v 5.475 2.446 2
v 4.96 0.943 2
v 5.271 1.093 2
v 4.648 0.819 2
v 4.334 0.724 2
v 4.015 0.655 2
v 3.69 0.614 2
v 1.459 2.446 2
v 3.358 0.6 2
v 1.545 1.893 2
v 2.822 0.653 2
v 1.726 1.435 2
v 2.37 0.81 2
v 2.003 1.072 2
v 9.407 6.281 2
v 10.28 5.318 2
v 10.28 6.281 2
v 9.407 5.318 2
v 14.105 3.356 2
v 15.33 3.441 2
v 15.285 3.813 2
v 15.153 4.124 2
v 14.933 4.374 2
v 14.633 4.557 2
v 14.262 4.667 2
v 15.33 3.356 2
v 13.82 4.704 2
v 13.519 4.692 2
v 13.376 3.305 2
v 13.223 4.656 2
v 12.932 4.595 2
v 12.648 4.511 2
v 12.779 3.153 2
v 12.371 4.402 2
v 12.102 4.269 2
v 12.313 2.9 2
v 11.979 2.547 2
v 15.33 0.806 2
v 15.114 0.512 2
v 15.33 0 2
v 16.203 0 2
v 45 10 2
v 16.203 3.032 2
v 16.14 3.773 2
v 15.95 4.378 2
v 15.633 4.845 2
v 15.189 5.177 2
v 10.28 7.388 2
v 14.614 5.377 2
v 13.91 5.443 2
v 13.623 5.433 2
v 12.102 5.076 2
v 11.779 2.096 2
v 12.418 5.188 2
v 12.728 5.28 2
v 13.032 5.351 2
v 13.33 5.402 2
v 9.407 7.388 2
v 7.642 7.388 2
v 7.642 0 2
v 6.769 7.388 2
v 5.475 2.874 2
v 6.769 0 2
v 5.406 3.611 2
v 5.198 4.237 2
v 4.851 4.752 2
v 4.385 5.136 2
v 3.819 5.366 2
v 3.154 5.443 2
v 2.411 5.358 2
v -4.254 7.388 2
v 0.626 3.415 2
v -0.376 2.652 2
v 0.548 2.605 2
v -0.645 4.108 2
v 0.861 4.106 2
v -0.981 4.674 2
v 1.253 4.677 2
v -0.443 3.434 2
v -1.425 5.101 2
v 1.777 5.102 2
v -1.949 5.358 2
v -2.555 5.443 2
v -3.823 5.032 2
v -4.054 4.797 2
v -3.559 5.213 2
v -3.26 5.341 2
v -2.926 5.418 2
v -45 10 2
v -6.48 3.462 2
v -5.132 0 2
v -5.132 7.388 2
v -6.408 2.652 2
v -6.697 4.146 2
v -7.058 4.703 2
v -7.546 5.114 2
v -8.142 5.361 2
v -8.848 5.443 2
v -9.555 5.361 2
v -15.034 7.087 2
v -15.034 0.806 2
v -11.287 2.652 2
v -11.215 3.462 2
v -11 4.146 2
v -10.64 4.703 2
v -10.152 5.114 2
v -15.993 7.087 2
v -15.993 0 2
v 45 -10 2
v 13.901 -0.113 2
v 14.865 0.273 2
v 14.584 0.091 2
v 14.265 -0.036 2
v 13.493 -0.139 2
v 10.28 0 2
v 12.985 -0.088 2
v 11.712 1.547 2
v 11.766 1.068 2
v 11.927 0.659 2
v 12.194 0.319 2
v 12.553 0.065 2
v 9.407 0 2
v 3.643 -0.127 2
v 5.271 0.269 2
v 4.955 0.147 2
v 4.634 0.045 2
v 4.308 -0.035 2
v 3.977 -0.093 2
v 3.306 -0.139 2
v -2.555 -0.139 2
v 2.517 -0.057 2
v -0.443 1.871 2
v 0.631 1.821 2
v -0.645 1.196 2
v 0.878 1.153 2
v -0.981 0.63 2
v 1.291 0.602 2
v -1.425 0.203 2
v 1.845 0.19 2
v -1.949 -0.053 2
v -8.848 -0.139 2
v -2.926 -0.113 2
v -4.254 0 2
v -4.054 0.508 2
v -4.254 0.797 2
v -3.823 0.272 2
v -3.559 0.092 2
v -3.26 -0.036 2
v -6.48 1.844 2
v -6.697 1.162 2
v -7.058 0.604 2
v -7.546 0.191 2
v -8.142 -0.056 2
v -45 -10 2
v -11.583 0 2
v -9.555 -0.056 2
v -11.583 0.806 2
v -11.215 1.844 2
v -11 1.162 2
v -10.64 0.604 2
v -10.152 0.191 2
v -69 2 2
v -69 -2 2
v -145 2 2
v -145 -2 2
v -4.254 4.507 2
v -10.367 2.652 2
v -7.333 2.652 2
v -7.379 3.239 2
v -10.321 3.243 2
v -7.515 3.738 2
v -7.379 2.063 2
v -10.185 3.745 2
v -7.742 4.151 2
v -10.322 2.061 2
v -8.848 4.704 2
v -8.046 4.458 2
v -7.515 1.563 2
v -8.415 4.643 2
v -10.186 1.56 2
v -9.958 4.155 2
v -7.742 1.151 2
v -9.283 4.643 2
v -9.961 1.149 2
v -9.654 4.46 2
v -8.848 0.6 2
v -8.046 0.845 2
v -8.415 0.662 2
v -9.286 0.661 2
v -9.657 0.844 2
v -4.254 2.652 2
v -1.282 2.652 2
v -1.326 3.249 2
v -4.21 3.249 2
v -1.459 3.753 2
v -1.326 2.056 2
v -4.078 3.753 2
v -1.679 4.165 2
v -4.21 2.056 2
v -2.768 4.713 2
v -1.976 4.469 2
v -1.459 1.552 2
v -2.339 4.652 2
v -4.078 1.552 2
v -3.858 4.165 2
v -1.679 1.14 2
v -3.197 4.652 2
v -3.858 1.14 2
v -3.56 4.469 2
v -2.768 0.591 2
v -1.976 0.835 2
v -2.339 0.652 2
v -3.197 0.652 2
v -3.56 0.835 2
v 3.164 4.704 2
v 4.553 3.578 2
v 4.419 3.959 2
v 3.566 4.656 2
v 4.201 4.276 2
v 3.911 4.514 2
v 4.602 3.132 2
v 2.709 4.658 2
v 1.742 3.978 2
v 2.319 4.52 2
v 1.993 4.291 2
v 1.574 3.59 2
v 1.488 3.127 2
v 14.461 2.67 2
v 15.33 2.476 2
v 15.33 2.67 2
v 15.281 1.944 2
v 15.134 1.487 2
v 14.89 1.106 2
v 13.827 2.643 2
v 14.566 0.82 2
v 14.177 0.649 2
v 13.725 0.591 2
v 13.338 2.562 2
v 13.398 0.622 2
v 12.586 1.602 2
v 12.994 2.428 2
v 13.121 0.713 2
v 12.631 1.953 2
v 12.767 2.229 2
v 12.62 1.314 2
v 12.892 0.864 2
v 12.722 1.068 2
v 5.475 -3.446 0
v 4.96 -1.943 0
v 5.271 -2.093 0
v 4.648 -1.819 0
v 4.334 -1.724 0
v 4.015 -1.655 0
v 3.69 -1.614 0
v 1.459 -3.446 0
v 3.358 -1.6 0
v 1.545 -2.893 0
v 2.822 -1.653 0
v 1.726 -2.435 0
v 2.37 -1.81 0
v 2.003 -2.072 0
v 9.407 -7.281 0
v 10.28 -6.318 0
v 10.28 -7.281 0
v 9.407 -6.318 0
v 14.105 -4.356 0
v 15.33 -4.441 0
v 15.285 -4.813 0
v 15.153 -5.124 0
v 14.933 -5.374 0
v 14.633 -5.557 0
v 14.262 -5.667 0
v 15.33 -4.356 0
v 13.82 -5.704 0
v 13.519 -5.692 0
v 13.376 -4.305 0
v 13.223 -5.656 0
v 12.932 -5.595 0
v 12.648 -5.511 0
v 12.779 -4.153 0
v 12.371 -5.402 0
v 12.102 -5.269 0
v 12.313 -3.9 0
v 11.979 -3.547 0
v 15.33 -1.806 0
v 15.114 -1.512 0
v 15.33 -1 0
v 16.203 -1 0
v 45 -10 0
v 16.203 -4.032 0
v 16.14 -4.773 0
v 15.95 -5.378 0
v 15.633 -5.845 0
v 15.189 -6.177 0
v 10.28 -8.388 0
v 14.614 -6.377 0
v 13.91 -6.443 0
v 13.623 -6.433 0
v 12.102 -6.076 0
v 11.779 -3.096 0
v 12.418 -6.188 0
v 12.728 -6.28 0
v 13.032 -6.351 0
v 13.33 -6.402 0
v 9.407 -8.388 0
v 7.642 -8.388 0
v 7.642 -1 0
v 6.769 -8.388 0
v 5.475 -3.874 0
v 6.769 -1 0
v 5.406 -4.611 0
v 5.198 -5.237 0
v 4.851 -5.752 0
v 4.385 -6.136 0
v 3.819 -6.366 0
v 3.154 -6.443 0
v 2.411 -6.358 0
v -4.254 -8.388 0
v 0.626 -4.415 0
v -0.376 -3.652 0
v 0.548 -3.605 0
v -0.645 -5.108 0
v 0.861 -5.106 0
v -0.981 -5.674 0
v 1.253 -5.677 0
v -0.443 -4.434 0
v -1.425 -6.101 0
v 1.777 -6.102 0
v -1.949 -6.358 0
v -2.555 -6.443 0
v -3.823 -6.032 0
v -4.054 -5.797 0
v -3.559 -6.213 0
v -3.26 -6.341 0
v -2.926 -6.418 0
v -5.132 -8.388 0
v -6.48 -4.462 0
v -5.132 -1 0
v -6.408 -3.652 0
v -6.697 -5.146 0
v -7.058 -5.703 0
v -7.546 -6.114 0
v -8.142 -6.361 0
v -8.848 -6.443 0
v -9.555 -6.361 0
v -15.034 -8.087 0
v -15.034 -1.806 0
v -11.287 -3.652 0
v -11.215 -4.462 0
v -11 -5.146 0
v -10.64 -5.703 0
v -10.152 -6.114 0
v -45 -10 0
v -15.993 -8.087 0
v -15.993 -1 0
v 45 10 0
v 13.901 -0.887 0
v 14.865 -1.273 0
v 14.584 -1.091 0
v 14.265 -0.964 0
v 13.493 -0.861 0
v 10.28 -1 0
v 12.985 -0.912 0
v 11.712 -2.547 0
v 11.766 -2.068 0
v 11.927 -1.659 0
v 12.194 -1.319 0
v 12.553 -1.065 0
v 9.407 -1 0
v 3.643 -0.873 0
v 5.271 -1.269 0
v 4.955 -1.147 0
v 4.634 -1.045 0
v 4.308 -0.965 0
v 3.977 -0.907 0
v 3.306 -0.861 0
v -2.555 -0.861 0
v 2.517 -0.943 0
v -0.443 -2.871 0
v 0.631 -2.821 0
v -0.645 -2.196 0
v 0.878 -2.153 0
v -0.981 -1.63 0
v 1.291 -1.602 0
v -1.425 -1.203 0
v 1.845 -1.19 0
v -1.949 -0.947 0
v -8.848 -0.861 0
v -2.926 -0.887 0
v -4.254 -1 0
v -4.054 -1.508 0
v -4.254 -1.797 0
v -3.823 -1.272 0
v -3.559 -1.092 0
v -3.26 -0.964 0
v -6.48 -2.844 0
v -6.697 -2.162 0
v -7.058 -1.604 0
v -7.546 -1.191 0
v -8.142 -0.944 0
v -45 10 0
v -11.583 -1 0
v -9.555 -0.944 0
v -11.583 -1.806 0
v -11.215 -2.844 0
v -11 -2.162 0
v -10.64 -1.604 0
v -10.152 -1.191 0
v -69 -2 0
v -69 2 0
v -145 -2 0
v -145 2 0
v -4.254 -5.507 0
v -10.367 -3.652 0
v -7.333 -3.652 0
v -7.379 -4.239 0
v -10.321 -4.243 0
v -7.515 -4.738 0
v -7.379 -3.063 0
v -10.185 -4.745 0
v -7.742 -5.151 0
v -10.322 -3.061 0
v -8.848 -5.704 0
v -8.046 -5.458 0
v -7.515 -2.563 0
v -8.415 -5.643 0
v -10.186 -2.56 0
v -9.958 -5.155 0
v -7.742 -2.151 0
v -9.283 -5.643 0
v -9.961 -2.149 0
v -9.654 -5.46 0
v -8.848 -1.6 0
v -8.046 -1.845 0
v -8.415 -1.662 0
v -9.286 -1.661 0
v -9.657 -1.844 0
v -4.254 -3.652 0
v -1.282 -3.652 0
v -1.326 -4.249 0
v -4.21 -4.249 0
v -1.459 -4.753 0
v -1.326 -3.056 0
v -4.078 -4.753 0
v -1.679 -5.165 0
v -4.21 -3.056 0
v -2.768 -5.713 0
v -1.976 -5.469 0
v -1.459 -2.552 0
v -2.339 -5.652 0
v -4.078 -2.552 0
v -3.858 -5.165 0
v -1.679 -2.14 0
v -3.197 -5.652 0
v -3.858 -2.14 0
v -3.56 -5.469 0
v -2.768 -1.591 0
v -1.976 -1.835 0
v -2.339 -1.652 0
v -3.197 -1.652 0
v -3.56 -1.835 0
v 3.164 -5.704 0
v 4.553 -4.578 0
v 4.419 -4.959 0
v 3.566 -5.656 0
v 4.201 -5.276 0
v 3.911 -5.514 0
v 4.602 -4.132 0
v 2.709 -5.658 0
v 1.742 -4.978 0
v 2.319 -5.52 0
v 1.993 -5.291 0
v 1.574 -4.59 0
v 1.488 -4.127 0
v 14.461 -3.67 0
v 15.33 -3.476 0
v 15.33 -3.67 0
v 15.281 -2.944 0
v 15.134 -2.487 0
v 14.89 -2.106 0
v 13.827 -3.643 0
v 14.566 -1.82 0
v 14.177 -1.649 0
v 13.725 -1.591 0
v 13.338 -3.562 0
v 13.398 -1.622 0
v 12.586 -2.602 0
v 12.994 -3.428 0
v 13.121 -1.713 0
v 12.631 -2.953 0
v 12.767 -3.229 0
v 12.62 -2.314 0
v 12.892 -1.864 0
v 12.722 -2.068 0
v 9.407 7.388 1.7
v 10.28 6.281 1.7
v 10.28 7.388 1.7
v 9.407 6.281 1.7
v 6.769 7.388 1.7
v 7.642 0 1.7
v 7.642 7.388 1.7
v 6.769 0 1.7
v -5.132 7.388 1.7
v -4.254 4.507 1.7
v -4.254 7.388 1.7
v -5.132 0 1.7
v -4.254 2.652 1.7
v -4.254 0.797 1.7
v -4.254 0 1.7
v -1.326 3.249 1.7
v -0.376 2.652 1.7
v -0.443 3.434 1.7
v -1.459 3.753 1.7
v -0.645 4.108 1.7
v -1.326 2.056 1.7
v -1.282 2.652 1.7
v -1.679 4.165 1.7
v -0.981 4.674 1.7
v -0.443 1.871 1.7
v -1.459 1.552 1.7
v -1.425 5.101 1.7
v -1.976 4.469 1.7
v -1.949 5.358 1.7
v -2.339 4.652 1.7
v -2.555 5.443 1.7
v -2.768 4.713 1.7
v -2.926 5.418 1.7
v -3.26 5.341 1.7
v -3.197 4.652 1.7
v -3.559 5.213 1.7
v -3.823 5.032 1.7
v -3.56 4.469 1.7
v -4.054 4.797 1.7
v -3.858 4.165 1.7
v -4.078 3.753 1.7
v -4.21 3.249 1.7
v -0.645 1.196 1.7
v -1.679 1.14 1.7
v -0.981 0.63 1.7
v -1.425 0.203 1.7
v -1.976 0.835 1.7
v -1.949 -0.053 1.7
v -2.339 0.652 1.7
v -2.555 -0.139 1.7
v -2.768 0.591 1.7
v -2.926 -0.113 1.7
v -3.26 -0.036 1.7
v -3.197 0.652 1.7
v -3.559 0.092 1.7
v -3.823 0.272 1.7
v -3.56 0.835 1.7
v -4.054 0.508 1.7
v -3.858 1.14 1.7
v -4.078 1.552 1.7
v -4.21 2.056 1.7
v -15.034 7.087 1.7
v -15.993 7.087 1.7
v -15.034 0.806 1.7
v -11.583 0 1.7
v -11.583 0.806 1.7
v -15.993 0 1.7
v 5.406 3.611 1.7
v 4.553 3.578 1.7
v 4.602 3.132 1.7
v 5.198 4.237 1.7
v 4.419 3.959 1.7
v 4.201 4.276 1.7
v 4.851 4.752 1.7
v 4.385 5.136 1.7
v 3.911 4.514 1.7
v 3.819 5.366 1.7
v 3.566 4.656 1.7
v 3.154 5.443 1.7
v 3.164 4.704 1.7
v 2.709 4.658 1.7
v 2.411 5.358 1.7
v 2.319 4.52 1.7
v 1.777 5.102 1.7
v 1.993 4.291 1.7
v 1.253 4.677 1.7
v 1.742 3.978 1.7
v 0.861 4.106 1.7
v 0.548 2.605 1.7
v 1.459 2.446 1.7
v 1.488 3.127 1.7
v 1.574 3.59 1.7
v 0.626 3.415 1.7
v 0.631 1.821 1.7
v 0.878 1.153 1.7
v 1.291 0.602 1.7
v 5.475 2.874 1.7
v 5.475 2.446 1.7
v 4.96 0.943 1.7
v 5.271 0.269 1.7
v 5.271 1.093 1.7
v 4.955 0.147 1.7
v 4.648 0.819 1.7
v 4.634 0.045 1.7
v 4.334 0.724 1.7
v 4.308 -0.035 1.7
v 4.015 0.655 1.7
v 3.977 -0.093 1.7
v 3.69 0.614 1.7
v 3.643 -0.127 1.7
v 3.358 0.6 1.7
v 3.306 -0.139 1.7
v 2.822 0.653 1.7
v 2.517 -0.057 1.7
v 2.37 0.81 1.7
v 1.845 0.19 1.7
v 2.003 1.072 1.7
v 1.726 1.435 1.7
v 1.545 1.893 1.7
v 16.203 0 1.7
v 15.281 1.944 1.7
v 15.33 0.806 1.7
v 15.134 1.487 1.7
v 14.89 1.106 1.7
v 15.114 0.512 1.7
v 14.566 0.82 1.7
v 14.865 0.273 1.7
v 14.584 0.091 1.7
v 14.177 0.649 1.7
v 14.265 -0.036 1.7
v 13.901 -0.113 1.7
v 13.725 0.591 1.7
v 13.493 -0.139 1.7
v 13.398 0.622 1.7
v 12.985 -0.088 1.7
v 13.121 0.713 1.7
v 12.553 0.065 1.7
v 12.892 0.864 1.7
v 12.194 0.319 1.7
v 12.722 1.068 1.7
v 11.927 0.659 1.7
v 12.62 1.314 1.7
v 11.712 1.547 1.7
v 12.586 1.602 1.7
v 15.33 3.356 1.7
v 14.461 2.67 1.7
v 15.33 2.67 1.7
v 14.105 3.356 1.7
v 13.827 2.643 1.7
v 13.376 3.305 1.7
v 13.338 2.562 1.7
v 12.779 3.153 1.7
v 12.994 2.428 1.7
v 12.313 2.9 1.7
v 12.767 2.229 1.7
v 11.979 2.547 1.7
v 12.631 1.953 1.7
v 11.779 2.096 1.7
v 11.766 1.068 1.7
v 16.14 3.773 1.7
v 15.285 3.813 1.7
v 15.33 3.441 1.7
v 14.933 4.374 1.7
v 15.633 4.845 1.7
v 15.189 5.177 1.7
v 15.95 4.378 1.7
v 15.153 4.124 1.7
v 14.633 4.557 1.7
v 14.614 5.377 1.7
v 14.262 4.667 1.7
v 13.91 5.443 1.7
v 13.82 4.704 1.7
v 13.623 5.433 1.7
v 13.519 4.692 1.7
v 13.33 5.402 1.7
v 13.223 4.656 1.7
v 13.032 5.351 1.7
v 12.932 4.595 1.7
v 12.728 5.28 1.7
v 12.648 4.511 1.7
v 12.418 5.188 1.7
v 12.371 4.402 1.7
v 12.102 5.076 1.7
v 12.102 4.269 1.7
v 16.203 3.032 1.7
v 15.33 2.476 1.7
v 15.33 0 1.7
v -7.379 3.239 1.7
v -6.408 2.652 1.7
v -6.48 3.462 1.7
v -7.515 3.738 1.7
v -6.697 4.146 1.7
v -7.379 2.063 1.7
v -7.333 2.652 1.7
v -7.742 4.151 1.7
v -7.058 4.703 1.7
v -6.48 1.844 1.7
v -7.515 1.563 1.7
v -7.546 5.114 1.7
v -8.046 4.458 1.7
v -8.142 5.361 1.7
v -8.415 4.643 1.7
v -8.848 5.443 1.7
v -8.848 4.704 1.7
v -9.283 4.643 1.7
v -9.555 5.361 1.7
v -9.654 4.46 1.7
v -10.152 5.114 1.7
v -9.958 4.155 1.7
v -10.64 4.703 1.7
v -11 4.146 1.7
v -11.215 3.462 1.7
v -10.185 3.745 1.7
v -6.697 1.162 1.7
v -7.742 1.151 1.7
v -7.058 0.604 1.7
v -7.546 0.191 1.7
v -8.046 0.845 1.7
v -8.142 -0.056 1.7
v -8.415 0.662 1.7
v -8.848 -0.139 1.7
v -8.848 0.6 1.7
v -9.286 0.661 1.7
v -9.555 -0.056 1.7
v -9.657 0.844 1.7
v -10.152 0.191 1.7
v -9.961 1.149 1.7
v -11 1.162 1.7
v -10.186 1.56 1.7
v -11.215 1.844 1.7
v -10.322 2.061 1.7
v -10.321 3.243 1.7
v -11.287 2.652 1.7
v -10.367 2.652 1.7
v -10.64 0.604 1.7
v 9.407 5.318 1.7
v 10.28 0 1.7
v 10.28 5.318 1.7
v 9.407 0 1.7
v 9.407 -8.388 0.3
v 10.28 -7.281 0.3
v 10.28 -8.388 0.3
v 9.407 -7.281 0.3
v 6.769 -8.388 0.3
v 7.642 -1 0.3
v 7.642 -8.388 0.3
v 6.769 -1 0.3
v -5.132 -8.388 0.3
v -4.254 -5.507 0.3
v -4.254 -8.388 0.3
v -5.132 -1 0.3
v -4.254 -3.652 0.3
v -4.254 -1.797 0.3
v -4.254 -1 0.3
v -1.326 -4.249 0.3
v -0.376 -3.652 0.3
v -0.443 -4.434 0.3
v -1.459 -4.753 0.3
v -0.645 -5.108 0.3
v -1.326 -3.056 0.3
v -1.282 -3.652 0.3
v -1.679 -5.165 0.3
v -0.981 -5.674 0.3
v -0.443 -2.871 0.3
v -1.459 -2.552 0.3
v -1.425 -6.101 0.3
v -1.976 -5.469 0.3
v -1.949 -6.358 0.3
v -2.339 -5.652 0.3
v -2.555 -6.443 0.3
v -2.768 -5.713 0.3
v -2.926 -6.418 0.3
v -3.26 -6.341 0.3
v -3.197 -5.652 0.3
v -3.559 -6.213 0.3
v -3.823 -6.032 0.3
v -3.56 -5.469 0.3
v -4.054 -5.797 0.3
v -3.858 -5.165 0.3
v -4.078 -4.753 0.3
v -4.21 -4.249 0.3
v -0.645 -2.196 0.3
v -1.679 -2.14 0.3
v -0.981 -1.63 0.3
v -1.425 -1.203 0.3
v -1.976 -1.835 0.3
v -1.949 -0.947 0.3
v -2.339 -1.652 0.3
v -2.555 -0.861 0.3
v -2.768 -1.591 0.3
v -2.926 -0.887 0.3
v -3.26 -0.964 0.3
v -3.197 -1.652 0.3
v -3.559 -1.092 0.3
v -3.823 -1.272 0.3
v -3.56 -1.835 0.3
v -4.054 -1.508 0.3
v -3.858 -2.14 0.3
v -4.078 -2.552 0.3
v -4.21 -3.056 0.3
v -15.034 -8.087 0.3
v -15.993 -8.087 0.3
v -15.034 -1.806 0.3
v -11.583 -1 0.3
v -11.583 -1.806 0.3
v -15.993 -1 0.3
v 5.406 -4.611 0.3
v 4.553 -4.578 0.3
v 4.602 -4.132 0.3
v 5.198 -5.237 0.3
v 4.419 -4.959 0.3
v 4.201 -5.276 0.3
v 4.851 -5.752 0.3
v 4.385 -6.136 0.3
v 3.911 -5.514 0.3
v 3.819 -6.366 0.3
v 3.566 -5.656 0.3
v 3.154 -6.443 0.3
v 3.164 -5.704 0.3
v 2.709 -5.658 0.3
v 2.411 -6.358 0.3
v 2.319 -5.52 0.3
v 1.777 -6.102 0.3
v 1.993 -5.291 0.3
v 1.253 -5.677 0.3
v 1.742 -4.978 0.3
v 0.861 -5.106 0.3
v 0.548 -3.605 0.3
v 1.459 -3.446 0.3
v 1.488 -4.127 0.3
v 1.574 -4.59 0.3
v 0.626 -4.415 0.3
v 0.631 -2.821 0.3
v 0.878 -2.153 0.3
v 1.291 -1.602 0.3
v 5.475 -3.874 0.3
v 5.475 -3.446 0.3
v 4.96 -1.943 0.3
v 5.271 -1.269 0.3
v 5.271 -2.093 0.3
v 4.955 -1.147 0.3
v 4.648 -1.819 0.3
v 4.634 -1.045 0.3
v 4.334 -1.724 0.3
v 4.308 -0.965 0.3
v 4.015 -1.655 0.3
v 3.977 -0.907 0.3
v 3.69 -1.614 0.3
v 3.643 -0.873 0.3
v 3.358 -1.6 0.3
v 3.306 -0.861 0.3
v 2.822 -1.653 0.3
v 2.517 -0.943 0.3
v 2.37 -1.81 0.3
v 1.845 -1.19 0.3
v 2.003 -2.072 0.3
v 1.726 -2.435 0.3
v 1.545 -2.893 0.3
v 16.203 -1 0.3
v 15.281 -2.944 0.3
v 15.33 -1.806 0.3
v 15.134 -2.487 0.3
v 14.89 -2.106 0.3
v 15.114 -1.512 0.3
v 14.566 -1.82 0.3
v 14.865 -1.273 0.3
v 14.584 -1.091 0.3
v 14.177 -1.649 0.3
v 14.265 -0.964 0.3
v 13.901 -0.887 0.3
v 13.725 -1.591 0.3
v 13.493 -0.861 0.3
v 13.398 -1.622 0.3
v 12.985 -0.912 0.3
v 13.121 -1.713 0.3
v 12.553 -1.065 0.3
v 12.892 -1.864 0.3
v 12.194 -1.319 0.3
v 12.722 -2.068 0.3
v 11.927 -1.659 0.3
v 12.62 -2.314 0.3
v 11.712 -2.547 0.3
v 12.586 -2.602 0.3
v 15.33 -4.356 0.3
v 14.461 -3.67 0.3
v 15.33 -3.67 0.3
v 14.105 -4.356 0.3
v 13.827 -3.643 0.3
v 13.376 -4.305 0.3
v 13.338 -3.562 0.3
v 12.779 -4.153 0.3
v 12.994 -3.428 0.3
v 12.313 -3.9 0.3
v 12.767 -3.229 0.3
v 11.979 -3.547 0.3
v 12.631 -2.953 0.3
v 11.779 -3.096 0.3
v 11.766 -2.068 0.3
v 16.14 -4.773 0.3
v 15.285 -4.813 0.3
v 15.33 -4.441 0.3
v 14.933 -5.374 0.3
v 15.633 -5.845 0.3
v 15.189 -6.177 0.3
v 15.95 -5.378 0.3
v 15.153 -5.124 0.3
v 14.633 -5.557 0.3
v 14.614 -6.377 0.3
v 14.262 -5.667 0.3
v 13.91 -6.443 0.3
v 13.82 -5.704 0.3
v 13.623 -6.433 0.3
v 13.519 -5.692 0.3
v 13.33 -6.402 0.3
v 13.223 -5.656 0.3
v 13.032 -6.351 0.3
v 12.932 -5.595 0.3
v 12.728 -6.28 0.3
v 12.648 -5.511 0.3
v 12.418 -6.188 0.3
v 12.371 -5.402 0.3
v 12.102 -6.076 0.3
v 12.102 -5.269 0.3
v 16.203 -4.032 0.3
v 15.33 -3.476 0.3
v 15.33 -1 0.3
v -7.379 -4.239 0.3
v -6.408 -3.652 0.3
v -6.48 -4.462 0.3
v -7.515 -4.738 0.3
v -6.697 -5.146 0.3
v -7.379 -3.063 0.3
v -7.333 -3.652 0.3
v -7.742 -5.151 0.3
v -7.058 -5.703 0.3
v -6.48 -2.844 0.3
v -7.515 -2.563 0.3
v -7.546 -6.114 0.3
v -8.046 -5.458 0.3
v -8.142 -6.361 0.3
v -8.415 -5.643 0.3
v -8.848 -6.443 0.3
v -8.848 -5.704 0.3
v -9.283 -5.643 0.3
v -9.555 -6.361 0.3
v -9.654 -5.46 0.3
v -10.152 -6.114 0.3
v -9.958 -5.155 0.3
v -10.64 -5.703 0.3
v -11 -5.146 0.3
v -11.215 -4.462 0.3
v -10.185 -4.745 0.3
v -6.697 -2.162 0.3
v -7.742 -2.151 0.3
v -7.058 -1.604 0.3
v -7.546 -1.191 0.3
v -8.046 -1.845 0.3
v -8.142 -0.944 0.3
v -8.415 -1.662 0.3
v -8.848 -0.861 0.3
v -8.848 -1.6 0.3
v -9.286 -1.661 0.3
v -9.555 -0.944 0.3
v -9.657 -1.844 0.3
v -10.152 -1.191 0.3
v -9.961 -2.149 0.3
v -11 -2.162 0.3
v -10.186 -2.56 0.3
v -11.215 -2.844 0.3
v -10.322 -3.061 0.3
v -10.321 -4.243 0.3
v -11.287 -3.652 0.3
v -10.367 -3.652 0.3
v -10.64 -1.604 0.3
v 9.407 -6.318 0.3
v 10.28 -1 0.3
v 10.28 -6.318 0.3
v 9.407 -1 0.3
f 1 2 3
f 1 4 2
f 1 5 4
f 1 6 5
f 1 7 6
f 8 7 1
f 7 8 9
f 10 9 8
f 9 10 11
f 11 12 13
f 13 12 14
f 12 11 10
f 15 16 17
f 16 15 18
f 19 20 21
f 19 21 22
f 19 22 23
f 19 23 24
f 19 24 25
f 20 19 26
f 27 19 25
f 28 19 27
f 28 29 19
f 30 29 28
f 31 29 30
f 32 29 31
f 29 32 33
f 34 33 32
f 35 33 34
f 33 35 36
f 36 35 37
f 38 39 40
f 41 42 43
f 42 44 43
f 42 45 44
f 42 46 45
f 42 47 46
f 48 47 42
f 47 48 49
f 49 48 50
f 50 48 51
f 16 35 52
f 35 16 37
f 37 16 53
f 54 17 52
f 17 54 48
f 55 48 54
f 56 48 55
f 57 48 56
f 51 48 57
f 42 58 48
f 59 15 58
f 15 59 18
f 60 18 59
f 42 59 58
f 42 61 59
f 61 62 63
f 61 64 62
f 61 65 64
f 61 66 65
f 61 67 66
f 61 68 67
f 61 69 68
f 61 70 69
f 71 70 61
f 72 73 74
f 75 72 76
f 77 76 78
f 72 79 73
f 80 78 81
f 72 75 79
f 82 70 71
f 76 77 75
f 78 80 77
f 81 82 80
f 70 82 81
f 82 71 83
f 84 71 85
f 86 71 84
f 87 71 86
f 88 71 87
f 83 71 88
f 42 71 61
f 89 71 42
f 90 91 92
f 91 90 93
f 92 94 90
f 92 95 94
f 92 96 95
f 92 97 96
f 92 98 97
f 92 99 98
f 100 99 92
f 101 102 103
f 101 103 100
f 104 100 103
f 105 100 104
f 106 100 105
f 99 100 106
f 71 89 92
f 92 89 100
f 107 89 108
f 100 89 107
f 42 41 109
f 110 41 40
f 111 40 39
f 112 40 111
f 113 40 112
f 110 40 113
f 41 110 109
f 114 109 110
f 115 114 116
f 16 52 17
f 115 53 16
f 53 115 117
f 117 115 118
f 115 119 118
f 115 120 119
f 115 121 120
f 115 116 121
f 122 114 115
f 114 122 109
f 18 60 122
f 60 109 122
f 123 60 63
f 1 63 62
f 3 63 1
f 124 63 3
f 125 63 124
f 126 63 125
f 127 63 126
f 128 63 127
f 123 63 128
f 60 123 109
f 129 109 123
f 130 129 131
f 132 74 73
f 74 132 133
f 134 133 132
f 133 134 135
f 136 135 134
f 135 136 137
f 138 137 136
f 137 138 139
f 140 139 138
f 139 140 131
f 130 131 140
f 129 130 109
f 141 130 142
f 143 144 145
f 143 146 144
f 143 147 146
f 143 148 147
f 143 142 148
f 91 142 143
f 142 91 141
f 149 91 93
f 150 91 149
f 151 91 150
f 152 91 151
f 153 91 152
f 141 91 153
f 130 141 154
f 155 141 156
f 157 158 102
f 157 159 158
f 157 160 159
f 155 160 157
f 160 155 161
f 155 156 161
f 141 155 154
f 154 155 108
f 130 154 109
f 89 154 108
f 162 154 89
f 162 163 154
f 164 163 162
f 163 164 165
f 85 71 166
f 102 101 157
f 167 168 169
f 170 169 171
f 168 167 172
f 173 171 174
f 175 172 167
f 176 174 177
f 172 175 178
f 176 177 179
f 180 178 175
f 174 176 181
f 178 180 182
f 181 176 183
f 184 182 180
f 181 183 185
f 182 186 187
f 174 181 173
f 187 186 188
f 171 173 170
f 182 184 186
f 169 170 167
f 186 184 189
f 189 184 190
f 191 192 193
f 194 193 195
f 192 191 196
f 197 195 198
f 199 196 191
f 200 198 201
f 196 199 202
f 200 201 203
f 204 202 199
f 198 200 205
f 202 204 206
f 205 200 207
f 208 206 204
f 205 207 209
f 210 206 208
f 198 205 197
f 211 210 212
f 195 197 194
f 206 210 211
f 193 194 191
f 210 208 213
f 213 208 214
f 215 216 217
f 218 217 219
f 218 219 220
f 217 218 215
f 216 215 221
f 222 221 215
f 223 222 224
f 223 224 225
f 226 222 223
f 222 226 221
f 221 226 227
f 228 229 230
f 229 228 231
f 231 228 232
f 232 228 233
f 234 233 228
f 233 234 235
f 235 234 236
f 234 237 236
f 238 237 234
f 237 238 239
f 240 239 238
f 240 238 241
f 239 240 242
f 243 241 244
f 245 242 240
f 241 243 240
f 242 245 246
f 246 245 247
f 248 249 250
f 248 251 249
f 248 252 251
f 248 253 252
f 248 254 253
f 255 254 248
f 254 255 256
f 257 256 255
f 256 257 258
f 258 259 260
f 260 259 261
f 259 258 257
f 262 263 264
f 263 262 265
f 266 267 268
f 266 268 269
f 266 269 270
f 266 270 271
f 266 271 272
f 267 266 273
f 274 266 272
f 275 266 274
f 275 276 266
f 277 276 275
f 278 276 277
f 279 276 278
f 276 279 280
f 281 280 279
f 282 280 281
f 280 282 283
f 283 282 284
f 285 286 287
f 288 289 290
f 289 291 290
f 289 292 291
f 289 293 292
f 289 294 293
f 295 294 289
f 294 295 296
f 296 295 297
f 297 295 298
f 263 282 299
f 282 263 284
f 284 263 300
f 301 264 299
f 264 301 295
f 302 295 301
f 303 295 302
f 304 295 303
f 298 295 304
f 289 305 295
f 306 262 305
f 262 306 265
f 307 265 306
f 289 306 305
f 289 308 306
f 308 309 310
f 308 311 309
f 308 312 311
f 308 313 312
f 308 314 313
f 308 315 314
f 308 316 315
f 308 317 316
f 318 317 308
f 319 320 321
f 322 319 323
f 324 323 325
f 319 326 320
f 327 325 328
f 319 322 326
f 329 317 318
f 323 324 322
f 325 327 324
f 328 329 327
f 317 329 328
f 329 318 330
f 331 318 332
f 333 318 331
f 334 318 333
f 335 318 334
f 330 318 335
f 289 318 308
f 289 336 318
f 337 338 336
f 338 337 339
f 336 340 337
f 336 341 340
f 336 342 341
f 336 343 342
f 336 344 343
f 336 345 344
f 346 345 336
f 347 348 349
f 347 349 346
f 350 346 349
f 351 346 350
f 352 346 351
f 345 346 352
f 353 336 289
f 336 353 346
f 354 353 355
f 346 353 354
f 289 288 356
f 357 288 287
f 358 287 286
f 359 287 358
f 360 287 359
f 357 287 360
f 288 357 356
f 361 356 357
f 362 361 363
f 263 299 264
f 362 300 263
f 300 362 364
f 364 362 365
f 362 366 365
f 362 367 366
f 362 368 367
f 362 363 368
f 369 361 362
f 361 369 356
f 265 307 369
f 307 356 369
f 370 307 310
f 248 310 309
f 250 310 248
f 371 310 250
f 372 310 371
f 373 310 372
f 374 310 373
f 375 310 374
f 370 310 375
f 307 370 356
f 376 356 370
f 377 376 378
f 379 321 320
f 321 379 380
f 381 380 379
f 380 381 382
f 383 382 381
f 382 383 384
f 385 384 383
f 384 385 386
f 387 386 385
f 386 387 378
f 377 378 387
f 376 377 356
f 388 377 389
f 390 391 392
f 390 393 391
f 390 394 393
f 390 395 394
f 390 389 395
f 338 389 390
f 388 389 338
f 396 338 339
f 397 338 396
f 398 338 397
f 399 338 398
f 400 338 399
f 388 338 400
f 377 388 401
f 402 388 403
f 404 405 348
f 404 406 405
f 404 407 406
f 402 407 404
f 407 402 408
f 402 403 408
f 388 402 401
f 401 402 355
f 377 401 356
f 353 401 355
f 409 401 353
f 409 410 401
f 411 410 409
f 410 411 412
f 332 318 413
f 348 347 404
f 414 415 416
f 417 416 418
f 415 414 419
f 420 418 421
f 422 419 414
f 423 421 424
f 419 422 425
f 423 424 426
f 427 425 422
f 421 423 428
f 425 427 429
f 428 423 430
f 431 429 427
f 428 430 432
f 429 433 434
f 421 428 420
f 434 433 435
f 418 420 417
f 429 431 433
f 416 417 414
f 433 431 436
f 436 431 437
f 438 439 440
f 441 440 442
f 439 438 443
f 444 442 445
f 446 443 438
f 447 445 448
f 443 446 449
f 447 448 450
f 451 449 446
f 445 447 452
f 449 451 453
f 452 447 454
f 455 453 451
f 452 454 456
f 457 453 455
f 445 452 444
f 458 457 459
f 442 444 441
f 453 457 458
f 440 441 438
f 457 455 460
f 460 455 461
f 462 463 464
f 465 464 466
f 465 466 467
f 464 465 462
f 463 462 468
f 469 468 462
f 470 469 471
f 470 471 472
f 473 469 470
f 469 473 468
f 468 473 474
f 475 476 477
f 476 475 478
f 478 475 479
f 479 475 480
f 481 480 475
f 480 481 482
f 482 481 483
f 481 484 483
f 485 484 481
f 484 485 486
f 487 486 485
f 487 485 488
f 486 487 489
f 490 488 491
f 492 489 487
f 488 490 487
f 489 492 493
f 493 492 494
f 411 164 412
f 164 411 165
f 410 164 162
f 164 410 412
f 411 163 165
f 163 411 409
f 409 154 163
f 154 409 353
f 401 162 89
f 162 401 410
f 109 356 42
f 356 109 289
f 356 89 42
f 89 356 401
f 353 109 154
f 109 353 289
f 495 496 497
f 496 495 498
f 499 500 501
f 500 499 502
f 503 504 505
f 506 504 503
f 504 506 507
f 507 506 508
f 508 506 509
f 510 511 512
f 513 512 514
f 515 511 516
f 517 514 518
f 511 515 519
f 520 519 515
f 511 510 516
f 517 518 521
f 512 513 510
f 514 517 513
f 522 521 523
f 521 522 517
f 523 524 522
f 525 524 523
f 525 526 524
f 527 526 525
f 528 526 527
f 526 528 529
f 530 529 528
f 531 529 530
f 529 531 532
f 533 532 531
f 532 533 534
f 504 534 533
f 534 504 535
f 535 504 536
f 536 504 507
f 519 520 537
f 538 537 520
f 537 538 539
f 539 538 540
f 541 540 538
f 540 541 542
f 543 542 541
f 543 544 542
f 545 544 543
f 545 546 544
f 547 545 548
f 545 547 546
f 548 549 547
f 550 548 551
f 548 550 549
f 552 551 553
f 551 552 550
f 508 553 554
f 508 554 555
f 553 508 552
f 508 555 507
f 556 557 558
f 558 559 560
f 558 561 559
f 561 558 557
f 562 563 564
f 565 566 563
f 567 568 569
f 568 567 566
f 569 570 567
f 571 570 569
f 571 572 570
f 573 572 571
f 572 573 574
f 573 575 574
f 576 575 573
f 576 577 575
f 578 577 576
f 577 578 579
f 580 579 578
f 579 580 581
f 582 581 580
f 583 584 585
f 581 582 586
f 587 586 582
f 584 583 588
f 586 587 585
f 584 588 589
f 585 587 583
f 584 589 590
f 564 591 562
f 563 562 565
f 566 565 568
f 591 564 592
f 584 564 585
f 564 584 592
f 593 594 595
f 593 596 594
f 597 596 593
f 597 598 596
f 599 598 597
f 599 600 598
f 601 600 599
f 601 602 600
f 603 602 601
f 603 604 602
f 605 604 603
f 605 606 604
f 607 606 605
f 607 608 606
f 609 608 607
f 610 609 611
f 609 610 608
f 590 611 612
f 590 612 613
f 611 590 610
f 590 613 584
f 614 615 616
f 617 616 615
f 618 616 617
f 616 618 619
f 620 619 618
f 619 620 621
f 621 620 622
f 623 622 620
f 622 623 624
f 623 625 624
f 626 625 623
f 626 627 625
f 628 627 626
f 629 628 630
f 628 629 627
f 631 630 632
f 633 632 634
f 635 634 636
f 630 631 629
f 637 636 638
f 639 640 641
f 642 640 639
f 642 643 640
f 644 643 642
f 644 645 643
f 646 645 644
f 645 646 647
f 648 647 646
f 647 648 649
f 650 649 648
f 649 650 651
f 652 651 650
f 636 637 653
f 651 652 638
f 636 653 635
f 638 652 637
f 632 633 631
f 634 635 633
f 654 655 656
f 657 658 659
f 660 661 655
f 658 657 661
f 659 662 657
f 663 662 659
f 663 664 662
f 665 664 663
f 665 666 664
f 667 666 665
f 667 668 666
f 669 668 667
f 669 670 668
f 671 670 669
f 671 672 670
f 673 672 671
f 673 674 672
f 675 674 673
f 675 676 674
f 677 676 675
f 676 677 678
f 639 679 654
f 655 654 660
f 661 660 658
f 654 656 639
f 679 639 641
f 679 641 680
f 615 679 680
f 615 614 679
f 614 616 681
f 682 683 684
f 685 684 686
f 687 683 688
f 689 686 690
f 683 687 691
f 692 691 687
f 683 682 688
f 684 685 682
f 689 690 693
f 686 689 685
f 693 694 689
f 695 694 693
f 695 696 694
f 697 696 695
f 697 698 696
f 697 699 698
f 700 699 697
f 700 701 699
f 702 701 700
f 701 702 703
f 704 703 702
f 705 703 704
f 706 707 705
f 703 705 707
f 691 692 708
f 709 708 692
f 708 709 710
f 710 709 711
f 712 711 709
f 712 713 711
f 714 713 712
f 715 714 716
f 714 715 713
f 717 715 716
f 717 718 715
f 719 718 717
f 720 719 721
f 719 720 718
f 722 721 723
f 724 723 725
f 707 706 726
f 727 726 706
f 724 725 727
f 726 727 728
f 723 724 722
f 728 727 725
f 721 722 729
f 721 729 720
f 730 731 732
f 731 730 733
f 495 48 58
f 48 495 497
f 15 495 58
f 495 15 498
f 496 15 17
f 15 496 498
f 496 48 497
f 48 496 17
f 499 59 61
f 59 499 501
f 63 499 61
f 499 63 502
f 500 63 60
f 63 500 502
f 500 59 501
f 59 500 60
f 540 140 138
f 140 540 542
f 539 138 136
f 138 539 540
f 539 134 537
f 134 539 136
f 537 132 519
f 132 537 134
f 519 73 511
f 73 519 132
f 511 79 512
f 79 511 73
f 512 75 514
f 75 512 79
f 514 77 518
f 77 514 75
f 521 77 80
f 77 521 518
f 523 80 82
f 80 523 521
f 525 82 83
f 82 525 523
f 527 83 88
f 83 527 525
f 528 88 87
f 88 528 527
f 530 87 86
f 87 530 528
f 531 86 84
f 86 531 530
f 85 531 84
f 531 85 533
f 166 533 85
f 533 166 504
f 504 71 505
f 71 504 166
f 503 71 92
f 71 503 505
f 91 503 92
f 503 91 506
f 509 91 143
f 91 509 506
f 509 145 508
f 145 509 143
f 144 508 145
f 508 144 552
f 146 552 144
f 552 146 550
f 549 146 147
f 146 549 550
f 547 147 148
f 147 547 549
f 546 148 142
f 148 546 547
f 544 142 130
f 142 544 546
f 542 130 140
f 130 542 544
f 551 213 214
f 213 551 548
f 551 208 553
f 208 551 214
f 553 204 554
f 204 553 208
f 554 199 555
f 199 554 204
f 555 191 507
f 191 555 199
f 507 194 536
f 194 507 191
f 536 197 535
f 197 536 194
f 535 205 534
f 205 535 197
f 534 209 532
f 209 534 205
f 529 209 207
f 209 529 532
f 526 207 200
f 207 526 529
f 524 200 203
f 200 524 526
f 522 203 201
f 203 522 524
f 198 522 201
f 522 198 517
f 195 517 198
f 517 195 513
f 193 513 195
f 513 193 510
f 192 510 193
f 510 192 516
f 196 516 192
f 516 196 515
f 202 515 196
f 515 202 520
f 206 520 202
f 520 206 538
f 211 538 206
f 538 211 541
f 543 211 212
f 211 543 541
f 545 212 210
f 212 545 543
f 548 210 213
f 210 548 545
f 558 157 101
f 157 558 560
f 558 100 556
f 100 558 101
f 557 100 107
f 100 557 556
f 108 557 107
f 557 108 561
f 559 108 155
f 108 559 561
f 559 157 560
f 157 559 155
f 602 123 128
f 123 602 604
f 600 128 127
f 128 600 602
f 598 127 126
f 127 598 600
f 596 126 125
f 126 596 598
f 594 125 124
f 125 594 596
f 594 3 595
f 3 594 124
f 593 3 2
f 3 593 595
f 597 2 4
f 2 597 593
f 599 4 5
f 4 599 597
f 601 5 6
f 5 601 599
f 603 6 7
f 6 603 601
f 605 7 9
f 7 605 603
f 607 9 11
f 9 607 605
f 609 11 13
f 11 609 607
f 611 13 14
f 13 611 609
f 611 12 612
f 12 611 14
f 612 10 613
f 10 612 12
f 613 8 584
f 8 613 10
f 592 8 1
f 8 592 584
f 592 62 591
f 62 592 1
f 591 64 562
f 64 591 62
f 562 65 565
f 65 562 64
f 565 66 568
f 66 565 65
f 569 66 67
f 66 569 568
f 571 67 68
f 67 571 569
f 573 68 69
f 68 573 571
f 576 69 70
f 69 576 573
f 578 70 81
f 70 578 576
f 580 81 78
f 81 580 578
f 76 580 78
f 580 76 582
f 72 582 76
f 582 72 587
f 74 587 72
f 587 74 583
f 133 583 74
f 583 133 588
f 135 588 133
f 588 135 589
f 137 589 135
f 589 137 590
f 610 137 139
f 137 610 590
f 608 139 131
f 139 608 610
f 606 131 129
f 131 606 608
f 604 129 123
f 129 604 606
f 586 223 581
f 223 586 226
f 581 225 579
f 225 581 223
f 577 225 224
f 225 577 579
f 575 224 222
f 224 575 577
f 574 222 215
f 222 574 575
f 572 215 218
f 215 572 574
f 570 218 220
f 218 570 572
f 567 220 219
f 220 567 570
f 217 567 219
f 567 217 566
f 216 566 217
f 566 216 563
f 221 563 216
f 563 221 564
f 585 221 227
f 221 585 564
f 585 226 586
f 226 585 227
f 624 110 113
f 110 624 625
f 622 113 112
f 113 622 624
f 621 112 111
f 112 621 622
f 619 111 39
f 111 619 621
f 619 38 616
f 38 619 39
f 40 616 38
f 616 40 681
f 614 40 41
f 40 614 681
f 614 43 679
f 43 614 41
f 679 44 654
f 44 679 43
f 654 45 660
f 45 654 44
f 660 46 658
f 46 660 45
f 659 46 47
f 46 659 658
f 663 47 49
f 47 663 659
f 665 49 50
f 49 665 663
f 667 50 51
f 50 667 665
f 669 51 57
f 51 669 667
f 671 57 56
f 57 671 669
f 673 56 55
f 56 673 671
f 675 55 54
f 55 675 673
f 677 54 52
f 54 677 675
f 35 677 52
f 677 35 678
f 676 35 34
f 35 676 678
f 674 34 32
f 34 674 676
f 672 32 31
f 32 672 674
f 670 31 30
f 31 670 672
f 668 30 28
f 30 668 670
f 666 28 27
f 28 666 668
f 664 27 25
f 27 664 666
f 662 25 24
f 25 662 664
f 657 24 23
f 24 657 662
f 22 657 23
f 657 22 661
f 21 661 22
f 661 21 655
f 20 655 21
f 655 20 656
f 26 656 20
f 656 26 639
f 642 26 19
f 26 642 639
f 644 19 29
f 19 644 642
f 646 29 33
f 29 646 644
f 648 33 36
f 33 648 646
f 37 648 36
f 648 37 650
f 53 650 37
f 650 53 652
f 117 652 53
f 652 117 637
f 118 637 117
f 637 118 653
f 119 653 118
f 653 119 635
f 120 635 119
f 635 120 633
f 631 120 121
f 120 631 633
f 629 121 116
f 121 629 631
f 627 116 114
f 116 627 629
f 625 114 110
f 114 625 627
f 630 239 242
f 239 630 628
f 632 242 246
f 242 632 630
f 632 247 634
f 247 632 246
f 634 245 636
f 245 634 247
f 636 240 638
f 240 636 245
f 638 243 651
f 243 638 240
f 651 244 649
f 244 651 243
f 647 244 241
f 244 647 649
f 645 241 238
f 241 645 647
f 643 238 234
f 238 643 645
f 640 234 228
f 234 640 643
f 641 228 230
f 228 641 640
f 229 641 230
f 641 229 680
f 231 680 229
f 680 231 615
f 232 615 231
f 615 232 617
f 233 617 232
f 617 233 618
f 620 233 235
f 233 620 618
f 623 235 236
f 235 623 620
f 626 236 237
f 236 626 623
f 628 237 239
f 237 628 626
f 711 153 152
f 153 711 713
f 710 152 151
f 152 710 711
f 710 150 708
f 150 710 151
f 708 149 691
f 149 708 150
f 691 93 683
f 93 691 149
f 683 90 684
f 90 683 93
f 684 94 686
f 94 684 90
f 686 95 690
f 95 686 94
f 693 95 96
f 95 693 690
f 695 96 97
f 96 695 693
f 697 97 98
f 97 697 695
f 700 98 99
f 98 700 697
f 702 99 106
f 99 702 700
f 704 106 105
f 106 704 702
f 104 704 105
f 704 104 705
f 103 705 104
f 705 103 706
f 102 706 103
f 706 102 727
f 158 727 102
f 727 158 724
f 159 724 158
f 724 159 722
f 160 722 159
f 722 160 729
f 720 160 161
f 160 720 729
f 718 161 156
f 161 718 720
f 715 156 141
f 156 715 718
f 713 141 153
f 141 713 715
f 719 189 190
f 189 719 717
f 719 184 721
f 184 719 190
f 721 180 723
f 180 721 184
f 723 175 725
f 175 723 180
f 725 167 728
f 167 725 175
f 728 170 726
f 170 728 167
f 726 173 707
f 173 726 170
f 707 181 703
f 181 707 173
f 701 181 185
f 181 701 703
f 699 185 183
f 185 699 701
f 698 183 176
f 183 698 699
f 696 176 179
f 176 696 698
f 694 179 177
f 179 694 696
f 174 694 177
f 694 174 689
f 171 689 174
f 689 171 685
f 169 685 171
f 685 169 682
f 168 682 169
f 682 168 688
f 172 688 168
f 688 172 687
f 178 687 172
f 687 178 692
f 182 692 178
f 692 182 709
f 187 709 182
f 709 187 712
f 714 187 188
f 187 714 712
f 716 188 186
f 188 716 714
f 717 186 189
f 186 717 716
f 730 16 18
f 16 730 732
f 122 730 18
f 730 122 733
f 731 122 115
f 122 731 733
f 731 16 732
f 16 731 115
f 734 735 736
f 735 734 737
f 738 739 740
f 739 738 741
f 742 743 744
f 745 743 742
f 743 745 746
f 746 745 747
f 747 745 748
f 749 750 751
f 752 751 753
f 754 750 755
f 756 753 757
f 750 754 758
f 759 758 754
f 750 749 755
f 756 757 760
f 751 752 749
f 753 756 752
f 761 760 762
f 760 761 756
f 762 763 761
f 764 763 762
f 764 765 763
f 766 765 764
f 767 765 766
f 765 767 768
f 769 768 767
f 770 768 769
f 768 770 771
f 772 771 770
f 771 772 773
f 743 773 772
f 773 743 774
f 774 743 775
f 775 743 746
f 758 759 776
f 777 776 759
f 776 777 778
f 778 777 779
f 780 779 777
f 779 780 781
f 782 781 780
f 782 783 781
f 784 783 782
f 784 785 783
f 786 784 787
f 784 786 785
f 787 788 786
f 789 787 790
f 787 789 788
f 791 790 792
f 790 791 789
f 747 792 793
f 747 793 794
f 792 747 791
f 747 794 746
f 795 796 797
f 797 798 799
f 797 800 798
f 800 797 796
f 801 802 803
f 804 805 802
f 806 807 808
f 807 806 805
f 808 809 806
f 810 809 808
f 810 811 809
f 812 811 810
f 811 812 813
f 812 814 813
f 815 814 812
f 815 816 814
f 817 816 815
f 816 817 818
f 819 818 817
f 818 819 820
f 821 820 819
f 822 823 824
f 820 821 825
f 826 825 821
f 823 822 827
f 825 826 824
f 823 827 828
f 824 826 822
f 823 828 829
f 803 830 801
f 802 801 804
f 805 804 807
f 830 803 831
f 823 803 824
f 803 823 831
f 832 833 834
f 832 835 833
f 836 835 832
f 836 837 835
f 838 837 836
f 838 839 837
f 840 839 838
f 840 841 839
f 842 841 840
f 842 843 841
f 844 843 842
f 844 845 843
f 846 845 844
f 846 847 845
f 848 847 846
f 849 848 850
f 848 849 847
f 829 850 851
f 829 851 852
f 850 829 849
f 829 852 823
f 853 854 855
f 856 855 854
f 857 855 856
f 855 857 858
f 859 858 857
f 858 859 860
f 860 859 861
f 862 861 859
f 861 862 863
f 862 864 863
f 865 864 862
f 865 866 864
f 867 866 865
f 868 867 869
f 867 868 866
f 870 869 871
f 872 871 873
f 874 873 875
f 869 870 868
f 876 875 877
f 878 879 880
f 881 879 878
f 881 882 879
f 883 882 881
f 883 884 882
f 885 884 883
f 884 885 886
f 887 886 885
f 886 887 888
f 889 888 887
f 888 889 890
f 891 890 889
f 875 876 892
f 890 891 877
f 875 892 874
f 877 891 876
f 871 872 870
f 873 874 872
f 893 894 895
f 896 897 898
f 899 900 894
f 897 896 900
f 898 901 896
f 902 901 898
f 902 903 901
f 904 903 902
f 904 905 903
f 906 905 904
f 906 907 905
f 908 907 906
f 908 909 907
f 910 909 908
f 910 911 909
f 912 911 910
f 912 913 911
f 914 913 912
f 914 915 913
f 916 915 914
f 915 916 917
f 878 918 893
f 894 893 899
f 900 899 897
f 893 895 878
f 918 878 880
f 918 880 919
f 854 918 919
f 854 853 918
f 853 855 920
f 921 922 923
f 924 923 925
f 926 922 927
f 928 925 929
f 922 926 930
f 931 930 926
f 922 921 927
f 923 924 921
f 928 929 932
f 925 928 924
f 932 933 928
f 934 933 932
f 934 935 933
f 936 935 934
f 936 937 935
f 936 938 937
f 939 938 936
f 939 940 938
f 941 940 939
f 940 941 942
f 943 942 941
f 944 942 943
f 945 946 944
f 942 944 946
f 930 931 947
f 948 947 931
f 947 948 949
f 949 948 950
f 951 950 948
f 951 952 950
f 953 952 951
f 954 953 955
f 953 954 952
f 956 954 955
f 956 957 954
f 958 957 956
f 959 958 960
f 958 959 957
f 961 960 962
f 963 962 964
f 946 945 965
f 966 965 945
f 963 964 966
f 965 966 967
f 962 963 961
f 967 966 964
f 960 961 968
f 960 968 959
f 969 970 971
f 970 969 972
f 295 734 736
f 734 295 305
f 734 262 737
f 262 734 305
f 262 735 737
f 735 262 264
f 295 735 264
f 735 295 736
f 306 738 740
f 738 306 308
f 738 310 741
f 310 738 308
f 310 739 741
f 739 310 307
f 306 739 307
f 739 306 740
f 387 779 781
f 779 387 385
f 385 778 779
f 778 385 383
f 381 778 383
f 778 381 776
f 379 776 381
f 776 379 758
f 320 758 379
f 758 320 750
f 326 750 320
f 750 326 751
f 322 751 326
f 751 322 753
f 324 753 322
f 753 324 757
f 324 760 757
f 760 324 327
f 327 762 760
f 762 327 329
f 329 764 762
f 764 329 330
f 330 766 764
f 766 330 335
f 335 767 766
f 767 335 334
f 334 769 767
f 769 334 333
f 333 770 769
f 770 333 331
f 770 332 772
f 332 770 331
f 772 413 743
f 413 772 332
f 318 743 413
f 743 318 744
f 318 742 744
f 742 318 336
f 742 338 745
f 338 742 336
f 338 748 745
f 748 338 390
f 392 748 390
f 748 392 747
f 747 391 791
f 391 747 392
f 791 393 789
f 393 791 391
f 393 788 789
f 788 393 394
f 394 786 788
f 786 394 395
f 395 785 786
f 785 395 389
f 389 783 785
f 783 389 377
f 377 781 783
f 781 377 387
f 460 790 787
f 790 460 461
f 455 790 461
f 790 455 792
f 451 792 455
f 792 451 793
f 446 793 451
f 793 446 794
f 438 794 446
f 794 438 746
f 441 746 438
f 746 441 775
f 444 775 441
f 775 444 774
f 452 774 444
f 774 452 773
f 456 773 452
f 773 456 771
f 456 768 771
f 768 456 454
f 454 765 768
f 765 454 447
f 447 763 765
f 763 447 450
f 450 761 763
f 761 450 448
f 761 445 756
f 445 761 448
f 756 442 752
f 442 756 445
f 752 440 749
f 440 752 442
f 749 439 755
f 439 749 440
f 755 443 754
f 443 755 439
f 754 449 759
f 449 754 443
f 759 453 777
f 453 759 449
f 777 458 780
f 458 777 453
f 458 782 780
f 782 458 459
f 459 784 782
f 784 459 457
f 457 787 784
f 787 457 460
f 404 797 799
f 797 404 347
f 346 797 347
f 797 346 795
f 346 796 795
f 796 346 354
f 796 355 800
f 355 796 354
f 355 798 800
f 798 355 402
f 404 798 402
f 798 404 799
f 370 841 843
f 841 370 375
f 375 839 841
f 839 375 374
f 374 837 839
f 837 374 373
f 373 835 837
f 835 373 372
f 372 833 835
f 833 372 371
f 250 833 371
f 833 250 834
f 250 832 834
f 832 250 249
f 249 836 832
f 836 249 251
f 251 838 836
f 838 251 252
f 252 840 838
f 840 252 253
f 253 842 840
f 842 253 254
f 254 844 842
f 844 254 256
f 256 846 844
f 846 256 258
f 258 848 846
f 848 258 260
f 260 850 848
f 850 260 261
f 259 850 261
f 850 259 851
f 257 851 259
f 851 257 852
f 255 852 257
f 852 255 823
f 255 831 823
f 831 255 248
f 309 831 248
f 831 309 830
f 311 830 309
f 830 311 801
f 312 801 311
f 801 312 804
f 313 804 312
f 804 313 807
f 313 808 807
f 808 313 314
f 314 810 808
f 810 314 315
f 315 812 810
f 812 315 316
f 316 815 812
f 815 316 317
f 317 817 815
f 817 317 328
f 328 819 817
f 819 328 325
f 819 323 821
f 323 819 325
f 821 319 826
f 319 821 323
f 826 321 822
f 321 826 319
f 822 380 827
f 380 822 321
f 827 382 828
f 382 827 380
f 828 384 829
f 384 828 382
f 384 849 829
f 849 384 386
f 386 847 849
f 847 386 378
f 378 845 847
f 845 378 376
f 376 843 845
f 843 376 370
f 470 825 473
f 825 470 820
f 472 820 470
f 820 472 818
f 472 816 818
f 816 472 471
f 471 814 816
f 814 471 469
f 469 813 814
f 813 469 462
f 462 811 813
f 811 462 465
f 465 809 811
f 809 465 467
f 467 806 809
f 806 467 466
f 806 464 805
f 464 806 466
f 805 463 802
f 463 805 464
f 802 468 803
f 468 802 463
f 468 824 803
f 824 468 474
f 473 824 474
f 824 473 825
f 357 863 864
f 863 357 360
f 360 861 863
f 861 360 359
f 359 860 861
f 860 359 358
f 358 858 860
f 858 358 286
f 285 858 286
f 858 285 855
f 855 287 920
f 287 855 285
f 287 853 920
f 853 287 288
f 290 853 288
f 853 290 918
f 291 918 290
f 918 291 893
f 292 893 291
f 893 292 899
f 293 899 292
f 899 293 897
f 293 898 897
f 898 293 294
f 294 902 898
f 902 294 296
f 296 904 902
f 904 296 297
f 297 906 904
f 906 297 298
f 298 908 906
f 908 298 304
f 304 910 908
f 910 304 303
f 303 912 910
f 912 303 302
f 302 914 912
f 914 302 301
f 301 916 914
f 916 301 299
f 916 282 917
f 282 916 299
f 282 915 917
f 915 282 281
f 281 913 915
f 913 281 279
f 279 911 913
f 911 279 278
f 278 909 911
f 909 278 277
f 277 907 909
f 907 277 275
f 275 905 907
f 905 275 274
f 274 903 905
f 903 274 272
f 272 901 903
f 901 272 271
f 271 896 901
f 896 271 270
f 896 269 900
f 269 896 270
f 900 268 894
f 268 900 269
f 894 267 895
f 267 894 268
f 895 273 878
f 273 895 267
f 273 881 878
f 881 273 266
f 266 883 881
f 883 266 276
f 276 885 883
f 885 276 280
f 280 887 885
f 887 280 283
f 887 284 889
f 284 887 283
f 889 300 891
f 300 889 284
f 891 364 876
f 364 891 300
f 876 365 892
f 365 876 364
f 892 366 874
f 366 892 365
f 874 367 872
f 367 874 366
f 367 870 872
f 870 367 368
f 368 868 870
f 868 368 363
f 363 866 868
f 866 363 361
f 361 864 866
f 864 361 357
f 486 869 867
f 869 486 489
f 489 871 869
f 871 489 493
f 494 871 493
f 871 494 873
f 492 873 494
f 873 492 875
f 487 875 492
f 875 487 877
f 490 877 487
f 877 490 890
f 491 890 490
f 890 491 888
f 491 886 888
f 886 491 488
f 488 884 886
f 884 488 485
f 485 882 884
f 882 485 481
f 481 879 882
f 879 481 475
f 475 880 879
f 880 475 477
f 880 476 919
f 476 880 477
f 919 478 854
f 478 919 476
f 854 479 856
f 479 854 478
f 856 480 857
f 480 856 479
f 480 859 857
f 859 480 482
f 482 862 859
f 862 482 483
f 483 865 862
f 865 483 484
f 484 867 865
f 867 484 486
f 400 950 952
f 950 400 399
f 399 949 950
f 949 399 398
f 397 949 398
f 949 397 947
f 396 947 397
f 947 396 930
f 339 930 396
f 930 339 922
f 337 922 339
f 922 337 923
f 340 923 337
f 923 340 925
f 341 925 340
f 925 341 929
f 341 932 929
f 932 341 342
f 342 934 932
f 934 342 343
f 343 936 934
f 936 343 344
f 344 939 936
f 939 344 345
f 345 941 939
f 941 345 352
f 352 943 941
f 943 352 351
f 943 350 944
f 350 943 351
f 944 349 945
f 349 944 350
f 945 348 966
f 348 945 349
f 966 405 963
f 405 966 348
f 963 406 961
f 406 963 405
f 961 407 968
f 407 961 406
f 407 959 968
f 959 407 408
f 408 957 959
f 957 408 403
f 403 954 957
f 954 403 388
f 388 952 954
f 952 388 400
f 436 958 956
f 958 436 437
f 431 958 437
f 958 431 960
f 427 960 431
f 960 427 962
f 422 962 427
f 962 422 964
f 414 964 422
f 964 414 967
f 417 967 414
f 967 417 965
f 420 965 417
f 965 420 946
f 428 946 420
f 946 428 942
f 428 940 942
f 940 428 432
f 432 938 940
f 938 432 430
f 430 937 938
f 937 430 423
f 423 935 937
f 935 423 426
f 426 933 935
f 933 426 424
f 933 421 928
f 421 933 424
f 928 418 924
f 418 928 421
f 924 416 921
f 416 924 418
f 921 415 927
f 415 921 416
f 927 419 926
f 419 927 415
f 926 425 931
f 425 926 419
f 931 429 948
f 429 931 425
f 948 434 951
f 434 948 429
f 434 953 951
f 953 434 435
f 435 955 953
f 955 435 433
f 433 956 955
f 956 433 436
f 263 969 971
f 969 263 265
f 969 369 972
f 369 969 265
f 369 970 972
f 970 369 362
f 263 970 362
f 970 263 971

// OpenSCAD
letter="Lobelia";
smallText="";
    
length = 90;    
textStart = 0; 
height = 2; 

module GetText(bigText, littleText) { 
    union() {         
        translate([textStart, 0, 1.7])
            color("black", 1)
                linear_extrude(height=.301, convexity=4)
                    text(bigText, 
                    font="Bitstream Vera Sans",
                    halign="center",
                    size=7
                    );
        
        translate([textStart, -8, 1.7])
            color("black", 1)
                linear_extrude(height=.301, convexity=4)
                    text(littleText, 
                    font="Bitstream Vera Sans",
                    halign="center",
                    size=5// 3 is too small, doesn't extrude
                          // 4 is readable, but leaves gaps
                    );
            }
}

// First extrusion 
/*marker_one*/difference () { 
    color("white", 1.0)
        union() { 
            //stem
            translate([-length/2 - 100, -2, 0])
                cube([100, 4, height]);
            
            // tapered neck 
            linear_extrude(height) { 
                polygon(points=[[-length/2 -30, 0], [-length / 2, +10], [-length /2, -10], [-length / 2 - 30, 0]]);
            } 
            
            //Broad flat area for text
            translate([-length/2, -10, 0])
                cube([length, 20, height], center=false) ;
        }
    
    // holes for text 
    color("black", 1) 
        union() { 
            GetText(letter, smallText); 

            rotate([180, 0, 0])
                translate([textStart, 1, -2])
                    GetText(letter, smallText); 
        }
}

// Second Extrusion
*union() { 
    GetText(letter, smallText); 

    rotate([180, 0, 0])
        translate([textStart, 1, -2])
            GetText(letter, smallText); 
}

    
